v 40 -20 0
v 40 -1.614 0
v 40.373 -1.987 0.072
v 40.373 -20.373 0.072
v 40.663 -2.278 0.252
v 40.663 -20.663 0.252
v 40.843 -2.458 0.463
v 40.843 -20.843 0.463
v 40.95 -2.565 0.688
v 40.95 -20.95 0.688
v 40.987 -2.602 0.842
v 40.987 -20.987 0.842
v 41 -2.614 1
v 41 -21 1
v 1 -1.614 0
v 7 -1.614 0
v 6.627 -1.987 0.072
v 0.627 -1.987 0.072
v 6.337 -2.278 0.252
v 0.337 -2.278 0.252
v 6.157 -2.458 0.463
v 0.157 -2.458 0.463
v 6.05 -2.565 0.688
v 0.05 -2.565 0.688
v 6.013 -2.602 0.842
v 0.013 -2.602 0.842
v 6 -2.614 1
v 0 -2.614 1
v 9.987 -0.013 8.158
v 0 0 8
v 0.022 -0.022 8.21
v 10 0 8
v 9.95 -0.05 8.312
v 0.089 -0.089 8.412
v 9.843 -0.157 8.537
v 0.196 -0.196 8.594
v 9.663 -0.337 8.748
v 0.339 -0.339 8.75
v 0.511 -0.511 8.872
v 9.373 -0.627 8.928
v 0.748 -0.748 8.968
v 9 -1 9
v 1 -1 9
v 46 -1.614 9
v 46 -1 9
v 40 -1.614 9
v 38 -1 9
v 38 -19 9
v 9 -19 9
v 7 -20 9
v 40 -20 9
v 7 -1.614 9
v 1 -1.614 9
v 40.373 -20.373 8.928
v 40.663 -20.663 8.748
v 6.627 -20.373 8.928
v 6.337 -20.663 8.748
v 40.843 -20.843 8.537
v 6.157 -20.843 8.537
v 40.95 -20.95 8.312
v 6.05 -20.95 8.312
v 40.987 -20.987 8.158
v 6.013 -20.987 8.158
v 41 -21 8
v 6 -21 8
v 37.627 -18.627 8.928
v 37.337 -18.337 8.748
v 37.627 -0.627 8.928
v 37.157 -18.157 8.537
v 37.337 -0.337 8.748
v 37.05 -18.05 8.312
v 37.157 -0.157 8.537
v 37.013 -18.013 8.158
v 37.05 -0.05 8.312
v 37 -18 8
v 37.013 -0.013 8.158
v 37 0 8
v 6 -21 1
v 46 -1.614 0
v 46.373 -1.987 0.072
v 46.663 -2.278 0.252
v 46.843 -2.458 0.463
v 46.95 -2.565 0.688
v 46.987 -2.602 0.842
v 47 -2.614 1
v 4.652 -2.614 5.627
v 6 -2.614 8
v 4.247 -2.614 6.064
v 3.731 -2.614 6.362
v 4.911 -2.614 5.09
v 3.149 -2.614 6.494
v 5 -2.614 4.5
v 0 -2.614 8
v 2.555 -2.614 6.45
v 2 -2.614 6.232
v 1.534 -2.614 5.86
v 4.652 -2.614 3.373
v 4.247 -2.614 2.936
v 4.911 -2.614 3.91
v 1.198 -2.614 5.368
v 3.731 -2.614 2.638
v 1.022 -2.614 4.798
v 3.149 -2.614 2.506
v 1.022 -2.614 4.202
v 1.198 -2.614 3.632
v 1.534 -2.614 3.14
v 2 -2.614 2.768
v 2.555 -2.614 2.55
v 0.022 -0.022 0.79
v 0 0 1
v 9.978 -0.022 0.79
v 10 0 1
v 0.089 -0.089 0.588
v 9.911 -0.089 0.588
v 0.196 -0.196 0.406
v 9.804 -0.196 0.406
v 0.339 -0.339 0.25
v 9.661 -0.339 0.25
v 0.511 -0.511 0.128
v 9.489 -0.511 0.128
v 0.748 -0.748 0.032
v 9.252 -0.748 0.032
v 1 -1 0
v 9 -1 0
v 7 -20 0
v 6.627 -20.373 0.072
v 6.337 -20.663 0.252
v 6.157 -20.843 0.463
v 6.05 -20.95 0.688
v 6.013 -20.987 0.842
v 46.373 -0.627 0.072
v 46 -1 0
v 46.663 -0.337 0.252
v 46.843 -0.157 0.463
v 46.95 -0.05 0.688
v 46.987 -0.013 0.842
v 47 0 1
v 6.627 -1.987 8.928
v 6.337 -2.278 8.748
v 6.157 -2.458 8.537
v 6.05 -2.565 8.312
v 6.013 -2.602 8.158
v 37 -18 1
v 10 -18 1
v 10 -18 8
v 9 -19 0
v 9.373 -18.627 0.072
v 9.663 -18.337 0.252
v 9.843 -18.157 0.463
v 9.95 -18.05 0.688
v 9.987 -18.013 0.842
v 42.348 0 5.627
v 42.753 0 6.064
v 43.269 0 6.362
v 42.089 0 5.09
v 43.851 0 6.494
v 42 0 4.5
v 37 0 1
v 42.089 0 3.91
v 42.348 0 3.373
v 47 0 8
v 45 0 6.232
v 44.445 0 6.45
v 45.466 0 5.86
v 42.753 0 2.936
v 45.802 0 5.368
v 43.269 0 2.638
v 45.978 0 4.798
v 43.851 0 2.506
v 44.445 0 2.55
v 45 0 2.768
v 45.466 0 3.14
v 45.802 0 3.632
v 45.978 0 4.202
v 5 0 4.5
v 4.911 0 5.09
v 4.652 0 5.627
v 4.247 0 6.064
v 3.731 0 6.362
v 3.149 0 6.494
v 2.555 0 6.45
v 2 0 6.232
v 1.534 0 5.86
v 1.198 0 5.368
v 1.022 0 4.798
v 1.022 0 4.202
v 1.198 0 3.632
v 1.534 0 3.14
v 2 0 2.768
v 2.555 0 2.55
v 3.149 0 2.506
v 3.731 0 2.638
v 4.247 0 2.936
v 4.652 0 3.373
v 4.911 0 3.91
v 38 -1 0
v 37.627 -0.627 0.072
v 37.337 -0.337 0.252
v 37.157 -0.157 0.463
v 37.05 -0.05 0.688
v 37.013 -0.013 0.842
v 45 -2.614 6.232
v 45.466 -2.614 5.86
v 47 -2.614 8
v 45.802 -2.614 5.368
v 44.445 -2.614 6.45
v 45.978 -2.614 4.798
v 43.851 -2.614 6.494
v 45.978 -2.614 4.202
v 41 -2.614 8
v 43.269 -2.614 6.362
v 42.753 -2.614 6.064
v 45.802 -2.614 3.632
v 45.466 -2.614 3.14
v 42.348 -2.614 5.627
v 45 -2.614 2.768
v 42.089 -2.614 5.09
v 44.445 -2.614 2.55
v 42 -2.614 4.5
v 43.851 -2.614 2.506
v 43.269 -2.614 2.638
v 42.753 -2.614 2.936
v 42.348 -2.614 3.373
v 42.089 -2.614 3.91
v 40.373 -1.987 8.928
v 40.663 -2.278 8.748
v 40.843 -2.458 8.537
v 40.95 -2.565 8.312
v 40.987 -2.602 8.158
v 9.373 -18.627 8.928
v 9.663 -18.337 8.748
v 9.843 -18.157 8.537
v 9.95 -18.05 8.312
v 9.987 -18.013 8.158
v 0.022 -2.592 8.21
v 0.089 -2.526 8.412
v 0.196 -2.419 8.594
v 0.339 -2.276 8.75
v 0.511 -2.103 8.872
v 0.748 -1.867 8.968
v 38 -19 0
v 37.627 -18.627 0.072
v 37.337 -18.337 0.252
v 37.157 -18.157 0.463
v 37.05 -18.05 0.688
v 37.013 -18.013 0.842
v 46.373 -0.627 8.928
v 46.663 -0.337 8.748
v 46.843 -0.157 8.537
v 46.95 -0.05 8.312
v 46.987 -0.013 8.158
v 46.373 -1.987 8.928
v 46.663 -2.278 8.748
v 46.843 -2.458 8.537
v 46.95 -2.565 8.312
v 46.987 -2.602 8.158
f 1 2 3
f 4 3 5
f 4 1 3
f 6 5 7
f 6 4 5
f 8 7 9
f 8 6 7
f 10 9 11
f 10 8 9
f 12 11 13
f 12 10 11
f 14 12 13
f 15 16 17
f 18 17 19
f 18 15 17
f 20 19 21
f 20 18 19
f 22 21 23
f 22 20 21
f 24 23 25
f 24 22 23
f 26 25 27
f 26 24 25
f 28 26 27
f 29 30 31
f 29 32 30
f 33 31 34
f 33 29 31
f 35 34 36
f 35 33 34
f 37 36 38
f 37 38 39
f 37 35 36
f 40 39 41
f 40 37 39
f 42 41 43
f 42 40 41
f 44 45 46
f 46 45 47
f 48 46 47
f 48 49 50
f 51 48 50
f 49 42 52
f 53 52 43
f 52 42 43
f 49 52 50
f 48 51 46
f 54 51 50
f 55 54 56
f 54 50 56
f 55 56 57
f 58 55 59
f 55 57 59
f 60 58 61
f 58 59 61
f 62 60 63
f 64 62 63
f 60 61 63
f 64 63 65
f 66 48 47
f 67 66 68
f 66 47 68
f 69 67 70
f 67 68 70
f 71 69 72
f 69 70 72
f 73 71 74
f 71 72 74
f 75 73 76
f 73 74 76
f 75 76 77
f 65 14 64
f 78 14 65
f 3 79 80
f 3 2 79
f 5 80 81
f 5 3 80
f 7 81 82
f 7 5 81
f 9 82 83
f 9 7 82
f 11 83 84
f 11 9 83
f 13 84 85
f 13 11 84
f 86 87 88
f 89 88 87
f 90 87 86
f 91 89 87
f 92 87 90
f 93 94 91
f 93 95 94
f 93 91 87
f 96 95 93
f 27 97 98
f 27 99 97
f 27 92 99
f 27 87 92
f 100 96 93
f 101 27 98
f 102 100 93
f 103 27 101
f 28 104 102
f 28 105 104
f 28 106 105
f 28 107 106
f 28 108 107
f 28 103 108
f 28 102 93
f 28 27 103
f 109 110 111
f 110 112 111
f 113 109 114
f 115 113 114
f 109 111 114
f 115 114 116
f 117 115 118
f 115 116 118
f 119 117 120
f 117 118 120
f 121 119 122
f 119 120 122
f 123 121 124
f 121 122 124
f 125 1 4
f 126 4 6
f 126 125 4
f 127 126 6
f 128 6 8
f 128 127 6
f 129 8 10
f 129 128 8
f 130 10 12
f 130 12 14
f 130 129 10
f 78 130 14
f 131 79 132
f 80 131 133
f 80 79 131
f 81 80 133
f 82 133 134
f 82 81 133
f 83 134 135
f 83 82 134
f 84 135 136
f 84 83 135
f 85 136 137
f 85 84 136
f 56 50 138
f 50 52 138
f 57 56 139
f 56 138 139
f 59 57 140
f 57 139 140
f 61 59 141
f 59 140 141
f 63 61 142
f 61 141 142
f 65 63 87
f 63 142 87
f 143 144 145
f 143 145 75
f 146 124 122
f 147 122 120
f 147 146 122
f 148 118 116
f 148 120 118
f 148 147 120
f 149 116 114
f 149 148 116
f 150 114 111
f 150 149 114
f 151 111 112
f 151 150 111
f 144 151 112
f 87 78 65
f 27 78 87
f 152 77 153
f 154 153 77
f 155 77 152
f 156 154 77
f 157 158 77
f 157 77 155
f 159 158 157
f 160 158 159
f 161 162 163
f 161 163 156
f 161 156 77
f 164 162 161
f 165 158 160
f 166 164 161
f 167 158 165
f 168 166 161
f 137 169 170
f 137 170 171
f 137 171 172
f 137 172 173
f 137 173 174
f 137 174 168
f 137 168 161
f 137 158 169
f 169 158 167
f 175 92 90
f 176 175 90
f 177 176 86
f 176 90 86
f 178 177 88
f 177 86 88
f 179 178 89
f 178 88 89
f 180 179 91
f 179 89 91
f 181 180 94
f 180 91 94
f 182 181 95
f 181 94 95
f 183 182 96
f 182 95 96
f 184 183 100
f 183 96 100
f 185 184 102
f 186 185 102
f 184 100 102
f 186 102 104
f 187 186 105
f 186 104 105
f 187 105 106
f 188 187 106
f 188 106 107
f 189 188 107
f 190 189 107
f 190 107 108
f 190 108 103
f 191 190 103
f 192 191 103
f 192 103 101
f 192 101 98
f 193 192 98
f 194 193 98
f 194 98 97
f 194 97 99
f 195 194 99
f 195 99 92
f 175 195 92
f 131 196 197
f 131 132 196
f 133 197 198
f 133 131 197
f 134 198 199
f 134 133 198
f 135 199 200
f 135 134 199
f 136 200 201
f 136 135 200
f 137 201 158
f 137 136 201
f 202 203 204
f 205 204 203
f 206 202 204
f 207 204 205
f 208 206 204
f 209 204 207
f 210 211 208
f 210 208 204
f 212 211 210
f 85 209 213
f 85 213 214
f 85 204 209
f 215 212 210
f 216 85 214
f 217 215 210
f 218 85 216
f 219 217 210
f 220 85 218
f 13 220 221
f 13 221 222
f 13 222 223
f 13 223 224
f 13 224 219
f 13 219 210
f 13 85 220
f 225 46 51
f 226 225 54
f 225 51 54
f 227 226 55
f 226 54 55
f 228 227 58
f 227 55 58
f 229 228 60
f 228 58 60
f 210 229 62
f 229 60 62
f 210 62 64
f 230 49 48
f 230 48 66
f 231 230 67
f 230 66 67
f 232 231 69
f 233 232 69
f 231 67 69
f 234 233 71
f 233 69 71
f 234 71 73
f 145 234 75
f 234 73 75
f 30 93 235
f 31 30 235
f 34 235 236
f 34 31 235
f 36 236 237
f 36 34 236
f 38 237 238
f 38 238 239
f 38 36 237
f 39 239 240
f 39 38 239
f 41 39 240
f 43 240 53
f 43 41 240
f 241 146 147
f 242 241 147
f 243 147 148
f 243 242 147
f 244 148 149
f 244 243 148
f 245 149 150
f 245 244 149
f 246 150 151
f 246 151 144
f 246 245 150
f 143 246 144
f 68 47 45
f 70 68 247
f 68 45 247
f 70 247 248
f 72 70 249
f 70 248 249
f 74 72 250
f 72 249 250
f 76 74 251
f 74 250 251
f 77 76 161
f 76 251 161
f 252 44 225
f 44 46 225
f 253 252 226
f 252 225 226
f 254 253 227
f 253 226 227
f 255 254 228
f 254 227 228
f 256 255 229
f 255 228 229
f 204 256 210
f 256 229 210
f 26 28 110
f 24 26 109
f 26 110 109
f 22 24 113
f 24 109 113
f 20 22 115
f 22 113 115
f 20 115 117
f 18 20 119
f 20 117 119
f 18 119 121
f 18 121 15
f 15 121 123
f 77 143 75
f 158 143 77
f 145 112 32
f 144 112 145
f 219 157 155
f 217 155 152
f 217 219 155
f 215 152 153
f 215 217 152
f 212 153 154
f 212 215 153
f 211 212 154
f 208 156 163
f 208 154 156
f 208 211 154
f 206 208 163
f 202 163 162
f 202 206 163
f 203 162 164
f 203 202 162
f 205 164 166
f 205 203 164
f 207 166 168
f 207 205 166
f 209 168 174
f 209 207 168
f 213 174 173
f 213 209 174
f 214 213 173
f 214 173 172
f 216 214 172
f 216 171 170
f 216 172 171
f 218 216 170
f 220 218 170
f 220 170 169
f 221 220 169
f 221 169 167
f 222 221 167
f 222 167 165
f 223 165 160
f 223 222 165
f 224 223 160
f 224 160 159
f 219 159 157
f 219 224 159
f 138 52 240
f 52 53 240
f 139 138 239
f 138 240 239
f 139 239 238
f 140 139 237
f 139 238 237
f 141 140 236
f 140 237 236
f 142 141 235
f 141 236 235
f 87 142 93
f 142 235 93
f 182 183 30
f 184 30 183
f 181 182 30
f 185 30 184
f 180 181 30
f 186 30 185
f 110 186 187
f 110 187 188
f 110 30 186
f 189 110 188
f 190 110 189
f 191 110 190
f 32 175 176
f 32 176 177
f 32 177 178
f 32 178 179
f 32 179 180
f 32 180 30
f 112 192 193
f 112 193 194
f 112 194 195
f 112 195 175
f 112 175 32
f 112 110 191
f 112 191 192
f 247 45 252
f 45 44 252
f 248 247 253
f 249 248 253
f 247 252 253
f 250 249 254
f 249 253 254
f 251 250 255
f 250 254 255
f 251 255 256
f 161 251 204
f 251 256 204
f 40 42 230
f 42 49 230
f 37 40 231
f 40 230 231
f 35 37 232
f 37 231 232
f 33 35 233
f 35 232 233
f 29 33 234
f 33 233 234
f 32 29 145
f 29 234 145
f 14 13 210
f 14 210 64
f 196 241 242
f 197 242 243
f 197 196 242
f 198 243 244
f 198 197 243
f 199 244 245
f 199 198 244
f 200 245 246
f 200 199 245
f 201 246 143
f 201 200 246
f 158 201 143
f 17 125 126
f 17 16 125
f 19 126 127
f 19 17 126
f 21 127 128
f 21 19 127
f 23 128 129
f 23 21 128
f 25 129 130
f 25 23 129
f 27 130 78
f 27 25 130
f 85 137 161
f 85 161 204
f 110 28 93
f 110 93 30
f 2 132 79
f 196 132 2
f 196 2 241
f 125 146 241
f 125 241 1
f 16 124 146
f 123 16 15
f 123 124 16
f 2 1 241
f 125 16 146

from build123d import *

# Parameters (mm, degrees)
BOSS_EXTRUDE1_DEPTH = 9
SKETCH2_R           = 2
CUT_EXTRUDE1_DEPTH  = 9
FILLET1_R           = 1


with BuildPart() as part:
    # Sketch1 → Boss-Extrude1 (new body)
    with BuildSketch(Plane.XY):
        Polygon((0, 0), (10, 0), (10, -18), (37, -18), (37, 0), (47, 0), (47, -2.614456703), (41, -2.614456703), (41, -21), (6, -21), (6, -2.614456703), (0, -2.614456703), align=None)
    extrude(amount=BOSS_EXTRUDE1_DEPTH)

    # Sketch2 → Cut-Extrude1 (cut)
    with BuildSketch(Plane.XZ.offset(2.614456703)):
        with Locations((3, 4.5)):
            Circle(SKETCH2_R)
    cut_extrude1 = extrude(amount=-CUT_EXTRUDE1_DEPTH, mode=Mode.SUBTRACT)

    # Mirror1: Cut-Extrude1 across plane
    add(cut_extrude1.mirror(Plane(origin=(23.5, 0, 0), x_dir=(0, 0, 1), z_dir=(1, 0, 0))), mode=Mode.SUBTRACT)

    # Fillet1
    fillet1_edges = [part.edges().sort_by_distance(p)[0] for p in [
        (5, 0, 0),
        (10, -9, 0),
        (6, -11.807228352, 9),
        (23.5, -18, 0),
        (37, -9, 0),
        (42, 0, 0),
        (47, -1.307228352, 0),
        (44, -2.614456703, 0),
        (41, -11.807228352, 0),
        (23.5, -21, 0),
        (6, -11.807228352, 0),
        (3, -2.614456703, 0),
        (0, -1.307228352, 0),
        (23.5, -21, 9),
        (41, -11.807228352, 9),
        (44, -2.614456703, 9),
        (47, -1.307228352, 9),
        (42, 0, 9),
        (37, -9, 9),
        (23.5, -18, 9),
        (10, -9, 9),
        (5, 0, 9),
        (0, -1.307228352, 9),
        (3, -2.614456703, 9),
    ]]
    fillet(fillet1_edges, radius=FILLET1_R)


solid = part.part
